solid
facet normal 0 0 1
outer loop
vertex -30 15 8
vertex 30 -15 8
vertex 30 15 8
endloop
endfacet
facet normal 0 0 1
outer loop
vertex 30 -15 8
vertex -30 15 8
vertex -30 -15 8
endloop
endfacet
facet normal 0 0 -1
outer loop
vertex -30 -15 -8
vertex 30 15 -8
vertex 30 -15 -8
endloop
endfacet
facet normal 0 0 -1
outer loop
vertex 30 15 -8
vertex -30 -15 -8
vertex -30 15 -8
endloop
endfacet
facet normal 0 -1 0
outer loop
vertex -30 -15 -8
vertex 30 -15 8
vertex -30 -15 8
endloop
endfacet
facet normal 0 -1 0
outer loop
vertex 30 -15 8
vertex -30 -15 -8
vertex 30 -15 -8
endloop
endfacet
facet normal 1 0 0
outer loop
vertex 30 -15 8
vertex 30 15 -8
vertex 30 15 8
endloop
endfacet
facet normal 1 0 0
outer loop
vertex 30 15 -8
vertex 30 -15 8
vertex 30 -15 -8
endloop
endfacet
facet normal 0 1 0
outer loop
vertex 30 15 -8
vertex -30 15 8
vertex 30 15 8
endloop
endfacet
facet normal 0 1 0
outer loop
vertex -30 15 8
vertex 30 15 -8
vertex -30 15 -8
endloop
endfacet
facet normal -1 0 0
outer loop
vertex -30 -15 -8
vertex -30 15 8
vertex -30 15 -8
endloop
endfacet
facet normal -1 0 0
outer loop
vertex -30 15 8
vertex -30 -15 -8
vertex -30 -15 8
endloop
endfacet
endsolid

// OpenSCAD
// ============================================================================
// Atom Lithography Machine — Parametric OpenSCAD Module (S9.4-02)
// ============================================================================
// part_id           : S9.4-02
// parent_bom_id     : S9.4
// subsystem         : S9
// part_name         : 20 mK NbTiN 5-Kademe Chebyshev/Klopfenstein 50 Ohm <-> 3 kOhm qRAM Kopru Modulu (4-ch, Exp142 S9.1-02, 0.38 kg)
// material          : Nb
// temp_stage        : 20 mK (MXC)
// vacuum_grade      : Kriyo-vakum
// tolerance         : S11<=-20 dB (4-8 GHz)
// computed_mass_kg  : 0.20818
// envelope_mm       : 68.100 x 30.000 x 16.000
// design_maturity   : M0_M1_DETAILED_CAD_DESIGN_ONLY
// no_lab_measurement: true
// iec61508_certified: false
// semi_s2_certified : false
// Units: millimeters (mm)
// ============================================================================

$fn = 64;

// Nominal bounding envelope parameters (mm)
bbox_x = 68.1000;
bbox_y = 30.0000;
bbox_z = 16.0000;

// Part-specific parametric dimensions
box_dx = 60.0;
box_dy = 30.0;
box_dz = 16.0;
z_in_ohm = 50.0;
z_out_ohm = 3000.0;
stages = 5;

// Interface / port parameters (mm)

module part_S9_4_02() {
  union() {
    // 20 mK shielded 5-stage Chebyshev qRAM transformer box
    cube([60.000, 30.000, 16.000], center=true);
  }
}

// World assembly mounting transform (global machine frame, mm / deg):
// translate([-650.000, 0.000, 408.000]) rotate([0.000, 0.000, 0.000]) part_S9_4_02();

part_S9_4_02();
